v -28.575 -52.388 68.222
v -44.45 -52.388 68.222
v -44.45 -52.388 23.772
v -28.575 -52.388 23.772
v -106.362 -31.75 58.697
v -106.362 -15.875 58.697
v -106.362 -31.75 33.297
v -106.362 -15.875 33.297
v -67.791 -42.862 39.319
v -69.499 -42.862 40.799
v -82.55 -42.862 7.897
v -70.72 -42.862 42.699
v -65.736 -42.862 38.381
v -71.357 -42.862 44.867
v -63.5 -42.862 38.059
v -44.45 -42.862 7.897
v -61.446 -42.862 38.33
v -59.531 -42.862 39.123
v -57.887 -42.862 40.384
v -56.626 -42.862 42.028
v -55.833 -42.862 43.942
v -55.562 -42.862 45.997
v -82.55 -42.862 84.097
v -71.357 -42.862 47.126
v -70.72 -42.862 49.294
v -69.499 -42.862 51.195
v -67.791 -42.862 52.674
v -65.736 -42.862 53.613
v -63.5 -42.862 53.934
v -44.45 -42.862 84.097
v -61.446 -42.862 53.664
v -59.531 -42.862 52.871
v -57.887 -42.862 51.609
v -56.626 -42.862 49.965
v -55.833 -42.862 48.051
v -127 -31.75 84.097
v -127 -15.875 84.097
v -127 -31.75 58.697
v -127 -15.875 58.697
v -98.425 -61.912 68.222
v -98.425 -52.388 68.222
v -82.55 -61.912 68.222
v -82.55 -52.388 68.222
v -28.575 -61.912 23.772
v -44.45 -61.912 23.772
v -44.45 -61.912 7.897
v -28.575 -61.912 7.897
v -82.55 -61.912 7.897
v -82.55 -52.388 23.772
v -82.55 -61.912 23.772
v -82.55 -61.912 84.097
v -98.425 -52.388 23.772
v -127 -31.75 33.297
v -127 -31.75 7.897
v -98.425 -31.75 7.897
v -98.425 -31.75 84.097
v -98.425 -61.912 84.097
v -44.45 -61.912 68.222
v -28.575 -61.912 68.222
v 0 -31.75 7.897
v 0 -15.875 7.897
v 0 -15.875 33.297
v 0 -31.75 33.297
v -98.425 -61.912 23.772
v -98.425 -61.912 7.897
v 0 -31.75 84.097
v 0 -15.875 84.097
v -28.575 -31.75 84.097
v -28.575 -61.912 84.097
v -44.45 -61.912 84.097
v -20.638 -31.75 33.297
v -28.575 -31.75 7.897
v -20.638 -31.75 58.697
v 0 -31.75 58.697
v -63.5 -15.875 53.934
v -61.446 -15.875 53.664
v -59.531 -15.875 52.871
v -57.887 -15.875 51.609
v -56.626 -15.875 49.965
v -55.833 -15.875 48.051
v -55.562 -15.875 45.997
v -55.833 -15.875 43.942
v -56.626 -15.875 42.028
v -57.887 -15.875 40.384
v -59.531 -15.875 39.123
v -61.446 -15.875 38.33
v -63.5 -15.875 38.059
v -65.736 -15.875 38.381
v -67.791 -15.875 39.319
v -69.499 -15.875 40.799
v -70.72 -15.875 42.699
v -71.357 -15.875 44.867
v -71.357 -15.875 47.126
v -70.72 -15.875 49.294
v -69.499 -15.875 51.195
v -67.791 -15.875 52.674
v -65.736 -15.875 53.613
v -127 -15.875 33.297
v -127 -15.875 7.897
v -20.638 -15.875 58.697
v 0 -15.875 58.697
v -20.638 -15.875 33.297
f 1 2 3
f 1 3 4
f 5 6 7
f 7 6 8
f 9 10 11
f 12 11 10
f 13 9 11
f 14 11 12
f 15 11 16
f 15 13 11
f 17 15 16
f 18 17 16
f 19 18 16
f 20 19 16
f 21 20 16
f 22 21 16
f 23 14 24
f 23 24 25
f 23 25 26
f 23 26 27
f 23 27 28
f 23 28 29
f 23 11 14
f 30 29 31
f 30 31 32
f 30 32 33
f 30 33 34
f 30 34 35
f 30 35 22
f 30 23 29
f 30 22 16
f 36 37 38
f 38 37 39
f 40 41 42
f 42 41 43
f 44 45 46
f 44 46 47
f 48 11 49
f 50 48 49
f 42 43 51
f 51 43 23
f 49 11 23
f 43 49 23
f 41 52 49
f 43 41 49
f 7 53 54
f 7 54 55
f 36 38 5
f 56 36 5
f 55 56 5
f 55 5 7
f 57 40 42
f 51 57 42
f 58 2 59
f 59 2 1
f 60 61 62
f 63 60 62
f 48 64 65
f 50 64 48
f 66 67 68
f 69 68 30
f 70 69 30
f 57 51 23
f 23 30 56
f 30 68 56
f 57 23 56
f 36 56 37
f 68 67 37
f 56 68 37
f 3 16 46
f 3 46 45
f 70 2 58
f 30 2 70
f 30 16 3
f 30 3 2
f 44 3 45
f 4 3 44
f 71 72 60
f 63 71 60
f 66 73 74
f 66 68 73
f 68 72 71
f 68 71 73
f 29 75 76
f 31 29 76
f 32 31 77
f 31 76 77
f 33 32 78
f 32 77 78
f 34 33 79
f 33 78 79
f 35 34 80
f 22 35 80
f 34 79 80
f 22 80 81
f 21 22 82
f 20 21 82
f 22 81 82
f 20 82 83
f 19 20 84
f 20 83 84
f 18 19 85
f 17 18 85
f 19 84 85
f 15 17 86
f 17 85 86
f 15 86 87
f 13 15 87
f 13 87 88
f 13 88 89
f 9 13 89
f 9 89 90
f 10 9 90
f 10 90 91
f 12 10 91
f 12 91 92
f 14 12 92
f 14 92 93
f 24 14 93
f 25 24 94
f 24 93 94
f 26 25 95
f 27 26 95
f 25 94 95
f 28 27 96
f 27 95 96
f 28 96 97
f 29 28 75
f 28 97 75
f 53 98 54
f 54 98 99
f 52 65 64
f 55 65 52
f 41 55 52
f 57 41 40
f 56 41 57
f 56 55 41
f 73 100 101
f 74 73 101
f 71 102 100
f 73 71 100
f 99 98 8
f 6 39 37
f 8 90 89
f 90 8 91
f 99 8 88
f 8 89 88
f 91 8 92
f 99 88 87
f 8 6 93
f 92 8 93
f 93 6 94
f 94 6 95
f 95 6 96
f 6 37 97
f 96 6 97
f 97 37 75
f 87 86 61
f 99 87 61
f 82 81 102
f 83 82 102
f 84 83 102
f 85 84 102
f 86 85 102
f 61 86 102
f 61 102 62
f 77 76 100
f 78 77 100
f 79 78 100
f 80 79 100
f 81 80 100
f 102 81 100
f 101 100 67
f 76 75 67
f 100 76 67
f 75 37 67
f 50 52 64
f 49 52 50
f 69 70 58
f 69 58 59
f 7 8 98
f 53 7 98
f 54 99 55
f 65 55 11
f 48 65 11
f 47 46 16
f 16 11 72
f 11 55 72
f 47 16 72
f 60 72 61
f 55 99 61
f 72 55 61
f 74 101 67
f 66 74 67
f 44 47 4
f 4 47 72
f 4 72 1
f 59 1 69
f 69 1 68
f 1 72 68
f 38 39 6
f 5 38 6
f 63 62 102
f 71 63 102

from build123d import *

# Parameters (mm, degrees)
F0_W     = 31.75
F0_H     = 31.75
F1_DEPTH = 31.75
F2_DEPTH = 92.075
F3_DEPTH = 53.975
F0_H_2   = 88.9
F4_DEPTH = 73.025
F5_SCALE = 0.5


with BuildPart() as f1:
    # F0 (on Front) → F1 (new body)
    with BuildSketch(Plane.XZ):
        Polygon((-69.85, 84.0967045993), (-127, 84.0967045993), (-127, 33.2967045993), (-85.725, 33.2967045993), (-85.725, -17.5032954007), (-127, -17.5032954007), (-127, -68.3032954007), (-69.85, -68.3032954007), (-69.85, -36.5532954007), (-69.85, 52.3467045993), align=None)
        with Locations((-53.975, 68.2217045993)):
            Rectangle(F0_W, F0_H)
        with BuildLine():
            Line((0, 84.0967045993), (-38.1, 84.0967045993))
            Line((-38.1, 84.0967045993), (-38.1, 52.3467045993))
            Line((-38.1, 52.3467045993), (-38.1, -36.5532954007))
            Line((-38.1, -36.5532954007), (-38.1, -68.3032954007))
            Line((-38.1, -68.3032954007), (0, -68.3032954007))
            Line((0, -68.3032954007), (0, -15.875))
            Line((0, -15.875), (0, -7.9782954007))
            ThreePointArc((0, -7.9782954007), (-15.875, 7.8967045993), (0, 23.7717045993))
            Line((0, 23.7717045993), (0, 84.0967045993))
        make_face()
        with BuildLine():
            Line((38.1, 84.0967045993), (0, 84.0967045993))
            Line((0, 84.0967045993), (0, 23.7717045993))
            ThreePointArc((0, 23.7717045993), (11.2253201513, 19.1220247506), (15.875, 7.8967045993))
            ThreePointArc((15.875, 7.8967045993), (11.2253201513, -3.3286155521), (0, -7.9782954007))
            Line((0, -7.9782954007), (0, -15.875))
            Line((0, -15.875), (0, -68.3032954007))
            Line((0, -68.3032954007), (38.1, -68.3032954007))
            Line((38.1, -68.3032954007), (38.1, -36.5532954007))
            Line((38.1, -36.5532954007), (38.1, 52.3467045993))
            Line((38.1, 52.3467045993), (38.1, 84.0967045993))
        make_face()
        with Locations((-53.975, -52.4282954007)):
            Rectangle(F0_W, F0_H)
        with Locations((53.975, 68.2217045993)):
            Rectangle(F0_W, F0_H)
        Polygon((127, 84.0967045993), (69.85, 84.0967045993), (69.85, 52.3467045993), (69.85, -36.5532954007), (69.85, -68.3032954007), (127, -68.3032954007), (127, -17.5032954007), (85.725, -17.5032954007), (85.725, 33.2967045993), (127, 33.2967045993), align=None)
        with Locations((53.975, -52.4282954007)):
            Rectangle(F0_W, F0_H)
    extrude(amount=F1_DEPTH)

    # F0 (on Front) → F2 (join)
    with BuildSketch(Plane.XZ):
        with Locations((-53.975, 68.2217045993)):
            Rectangle(F0_W, F0_H)
        with Locations((-53.975, -52.4282954007)):
            Rectangle(F0_W, F0_H)
        with Locations((53.975, -52.4282954007)):
            Rectangle(F0_W, F0_H)
        with Locations((53.975, 68.2217045993)):
            Rectangle(F0_W, F0_H)
    extrude(amount=F2_DEPTH)

    # F0 (on Front) → F3 (join)
    with BuildSketch(Plane.XZ):
        with BuildLine():
            Line((0, 84.0967045993), (-38.1, 84.0967045993))
            Line((-38.1, 84.0967045993), (-38.1, 52.3467045993))
            Line((-38.1, 52.3467045993), (-38.1, -36.5532954007))
            Line((-38.1, -36.5532954007), (-38.1, -68.3032954007))
            Line((-38.1, -68.3032954007), (0, -68.3032954007))
            Line((0, -68.3032954007), (0, -15.875))
            Line((0, -15.875), (0, -7.9782954007))
            ThreePointArc((0, -7.9782954007), (-15.875, 7.8967045993), (0, 23.7717045993))
            Line((0, 23.7717045993), (0, 84.0967045993))
        make_face()
        with BuildLine():
            Line((38.1, 84.0967045993), (0, 84.0967045993))
            Line((0, 84.0967045993), (0, 23.7717045993))
            ThreePointArc((0, 23.7717045993), (11.2253201513, 19.1220247506), (15.875, 7.8967045993))
            ThreePointArc((15.875, 7.8967045993), (11.2253201513, -3.3286155521), (0, -7.9782954007))
            Line((0, -7.9782954007), (0, -15.875))
            Line((0, -15.875), (0, -68.3032954007))
            Line((0, -68.3032954007), (38.1, -68.3032954007))
            Line((38.1, -68.3032954007), (38.1, -36.5532954007))
            Line((38.1, -36.5532954007), (38.1, 52.3467045993))
            Line((38.1, 52.3467045993), (38.1, 84.0967045993))
        make_face()
    extrude(amount=F3_DEPTH)

    # F0 (on Front) → F4 (join)
    with BuildSketch(Plane.XZ):
        with Locations((-53.975, 7.8967045993)):
            Rectangle(F0_W, F0_H_2)
        with Locations((53.975, 7.8967045993)):
            Rectangle(F0_W, F0_H_2)
    extrude(amount=F4_DEPTH)


with BuildPart() as f1_1:
    # F5: moved
    add(f1.part.scale(F5_SCALE).moved(Location((-63.5, -15.875, 42.0483522996))))


solid = f1_1.part
